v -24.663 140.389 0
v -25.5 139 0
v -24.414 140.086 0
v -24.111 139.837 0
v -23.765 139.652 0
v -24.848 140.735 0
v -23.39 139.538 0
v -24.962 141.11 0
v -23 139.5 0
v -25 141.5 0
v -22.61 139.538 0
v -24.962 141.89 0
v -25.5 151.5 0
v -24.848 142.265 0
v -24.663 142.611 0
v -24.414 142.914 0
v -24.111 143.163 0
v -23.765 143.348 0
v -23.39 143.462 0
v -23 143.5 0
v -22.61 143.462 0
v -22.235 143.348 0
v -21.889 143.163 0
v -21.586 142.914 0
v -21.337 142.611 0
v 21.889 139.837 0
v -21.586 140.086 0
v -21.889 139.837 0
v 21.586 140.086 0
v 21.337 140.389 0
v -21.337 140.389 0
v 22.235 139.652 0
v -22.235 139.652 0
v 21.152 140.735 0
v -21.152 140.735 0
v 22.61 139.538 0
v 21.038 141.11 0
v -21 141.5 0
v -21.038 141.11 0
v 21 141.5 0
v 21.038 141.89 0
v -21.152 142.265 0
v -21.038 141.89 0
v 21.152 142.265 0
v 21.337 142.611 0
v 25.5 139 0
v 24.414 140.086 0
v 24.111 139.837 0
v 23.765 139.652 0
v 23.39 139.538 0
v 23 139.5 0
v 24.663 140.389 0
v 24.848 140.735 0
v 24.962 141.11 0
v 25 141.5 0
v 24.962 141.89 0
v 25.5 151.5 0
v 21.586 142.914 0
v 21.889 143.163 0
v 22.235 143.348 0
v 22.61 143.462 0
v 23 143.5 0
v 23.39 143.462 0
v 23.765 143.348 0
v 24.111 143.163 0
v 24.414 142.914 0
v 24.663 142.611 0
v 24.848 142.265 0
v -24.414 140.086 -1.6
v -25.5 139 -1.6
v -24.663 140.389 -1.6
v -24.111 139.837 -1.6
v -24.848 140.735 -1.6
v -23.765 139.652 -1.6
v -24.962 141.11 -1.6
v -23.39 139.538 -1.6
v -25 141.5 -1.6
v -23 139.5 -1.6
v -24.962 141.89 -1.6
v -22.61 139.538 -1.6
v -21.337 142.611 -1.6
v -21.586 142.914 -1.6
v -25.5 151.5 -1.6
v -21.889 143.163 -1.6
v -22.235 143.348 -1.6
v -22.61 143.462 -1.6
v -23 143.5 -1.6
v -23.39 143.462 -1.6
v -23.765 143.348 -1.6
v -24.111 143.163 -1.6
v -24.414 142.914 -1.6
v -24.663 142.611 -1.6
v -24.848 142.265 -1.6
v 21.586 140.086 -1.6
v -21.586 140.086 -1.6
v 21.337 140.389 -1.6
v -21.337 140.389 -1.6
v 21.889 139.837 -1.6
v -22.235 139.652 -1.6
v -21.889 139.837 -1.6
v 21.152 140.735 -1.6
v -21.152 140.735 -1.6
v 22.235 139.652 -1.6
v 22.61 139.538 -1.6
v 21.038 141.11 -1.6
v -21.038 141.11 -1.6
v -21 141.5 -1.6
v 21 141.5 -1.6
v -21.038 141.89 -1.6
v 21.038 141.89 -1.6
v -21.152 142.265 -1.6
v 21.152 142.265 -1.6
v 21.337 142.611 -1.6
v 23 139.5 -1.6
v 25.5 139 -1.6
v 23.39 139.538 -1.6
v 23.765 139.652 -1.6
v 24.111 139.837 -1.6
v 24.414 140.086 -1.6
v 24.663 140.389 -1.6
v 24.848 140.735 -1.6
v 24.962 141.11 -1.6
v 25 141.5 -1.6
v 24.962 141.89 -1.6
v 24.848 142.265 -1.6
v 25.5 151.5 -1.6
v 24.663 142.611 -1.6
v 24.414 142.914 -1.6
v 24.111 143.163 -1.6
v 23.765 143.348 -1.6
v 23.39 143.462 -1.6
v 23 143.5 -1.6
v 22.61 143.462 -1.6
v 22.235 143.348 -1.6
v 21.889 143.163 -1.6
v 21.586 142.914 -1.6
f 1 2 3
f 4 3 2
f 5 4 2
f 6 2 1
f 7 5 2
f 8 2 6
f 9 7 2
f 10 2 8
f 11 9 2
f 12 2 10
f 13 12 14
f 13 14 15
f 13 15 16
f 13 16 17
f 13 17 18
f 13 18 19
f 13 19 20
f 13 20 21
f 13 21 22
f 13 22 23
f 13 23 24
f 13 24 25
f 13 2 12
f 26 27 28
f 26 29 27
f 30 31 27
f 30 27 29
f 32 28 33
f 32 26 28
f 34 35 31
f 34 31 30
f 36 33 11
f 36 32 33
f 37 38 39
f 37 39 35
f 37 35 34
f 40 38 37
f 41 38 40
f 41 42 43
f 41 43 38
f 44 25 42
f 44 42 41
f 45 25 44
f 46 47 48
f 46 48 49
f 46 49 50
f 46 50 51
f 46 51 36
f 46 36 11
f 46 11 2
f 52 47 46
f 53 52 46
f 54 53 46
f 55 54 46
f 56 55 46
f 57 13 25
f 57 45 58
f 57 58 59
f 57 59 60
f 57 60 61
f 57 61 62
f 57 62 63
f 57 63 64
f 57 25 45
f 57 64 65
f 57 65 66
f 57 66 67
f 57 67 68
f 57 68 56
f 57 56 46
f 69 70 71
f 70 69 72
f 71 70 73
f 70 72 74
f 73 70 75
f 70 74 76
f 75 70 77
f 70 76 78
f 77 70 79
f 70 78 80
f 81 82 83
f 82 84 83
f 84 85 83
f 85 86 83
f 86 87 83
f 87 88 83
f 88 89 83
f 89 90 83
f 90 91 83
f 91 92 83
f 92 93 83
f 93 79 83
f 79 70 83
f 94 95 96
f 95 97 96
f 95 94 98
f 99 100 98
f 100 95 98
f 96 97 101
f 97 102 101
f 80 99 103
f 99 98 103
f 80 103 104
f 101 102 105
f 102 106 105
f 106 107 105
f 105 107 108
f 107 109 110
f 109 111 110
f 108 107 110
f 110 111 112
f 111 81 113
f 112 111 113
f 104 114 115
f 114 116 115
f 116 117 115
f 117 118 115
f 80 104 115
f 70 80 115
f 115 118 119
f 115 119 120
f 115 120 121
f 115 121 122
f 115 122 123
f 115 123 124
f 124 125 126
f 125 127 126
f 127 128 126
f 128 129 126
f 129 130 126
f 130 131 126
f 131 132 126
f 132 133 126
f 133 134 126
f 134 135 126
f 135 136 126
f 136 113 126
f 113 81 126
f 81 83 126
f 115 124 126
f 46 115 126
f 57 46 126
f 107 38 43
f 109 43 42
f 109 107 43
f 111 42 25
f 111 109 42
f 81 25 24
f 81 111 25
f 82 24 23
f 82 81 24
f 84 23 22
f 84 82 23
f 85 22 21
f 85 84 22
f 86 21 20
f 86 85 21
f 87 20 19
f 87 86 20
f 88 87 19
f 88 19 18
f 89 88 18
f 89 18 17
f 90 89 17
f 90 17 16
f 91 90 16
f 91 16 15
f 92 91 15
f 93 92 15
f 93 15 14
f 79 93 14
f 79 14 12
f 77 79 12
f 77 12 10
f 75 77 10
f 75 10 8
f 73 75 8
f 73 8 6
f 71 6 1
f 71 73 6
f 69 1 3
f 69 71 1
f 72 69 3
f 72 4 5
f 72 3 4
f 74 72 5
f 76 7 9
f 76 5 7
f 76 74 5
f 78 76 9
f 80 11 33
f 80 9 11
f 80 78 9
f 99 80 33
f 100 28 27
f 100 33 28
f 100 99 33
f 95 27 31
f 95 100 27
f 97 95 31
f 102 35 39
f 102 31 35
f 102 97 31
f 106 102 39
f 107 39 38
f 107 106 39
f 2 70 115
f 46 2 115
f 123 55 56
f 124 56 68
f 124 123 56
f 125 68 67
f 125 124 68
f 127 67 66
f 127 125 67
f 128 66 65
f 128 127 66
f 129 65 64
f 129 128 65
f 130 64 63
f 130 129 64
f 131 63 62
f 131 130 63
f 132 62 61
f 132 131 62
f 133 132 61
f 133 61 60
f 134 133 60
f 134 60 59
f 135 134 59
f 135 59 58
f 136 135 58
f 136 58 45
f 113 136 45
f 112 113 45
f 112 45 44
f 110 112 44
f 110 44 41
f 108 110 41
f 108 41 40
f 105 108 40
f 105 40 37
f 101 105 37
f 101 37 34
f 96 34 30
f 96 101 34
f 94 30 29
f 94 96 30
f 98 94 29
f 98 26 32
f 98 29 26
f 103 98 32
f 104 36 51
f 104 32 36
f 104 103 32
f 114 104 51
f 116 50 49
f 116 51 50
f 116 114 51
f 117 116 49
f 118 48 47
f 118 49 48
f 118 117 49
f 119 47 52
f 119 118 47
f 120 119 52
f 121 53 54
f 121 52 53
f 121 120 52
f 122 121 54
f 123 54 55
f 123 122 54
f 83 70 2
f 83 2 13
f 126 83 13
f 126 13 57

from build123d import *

# Parameters (mm, degrees)
CYLINDER047_R     = 2
CYLINDER047_DEPTH = 10
CYLINDER048_R     = 2
CYLINDER048_DEPTH = 10
BOX_W             = 51
BOX_H             = 12.5
BOX_DEPTH         = 1.6


with BuildPart() as cylinder047:
    # Cylinder047 → Cylinder047 (new body)
    with BuildSketch(Plane(origin=(23, 2.5, 0), x_dir=(1, 0, 0), z_dir=(0, 0, 1))):
        Circle(CYLINDER047_R)
    extrude(amount=CYLINDER047_DEPTH)


with BuildPart() as fusion036:
    # Cylinder048 → Cylinder048 (new body)
    with BuildSketch(Plane(origin=(-23, 2.5, 0), x_dir=(1, 0, 0), z_dir=(0, 0, 1))):
        Circle(CYLINDER048_R)
    extrude(amount=CYLINDER048_DEPTH)

    # Fusion036: union Cylinder047
    add(cylinder047.part)


with BuildPart() as sensor:
    # Box → Box (new body)
    with BuildSketch(Plane(origin=(-25.5, 0, 0), x_dir=(1, 0, 0), z_dir=(0, 0, 1))):
        with Locations((25.5, 6.25)):
            Rectangle(BOX_W, BOX_H)
    extrude(amount=BOX_DEPTH)

    # Cut: cut Fusion036
    add(fusion036.part, mode=Mode.SUBTRACT)


with BuildPart() as sensor_1:
    # Cut placement: moved
    add(sensor.part.moved(Location((0, 139, -1.6))))


solid = sensor_1.part
